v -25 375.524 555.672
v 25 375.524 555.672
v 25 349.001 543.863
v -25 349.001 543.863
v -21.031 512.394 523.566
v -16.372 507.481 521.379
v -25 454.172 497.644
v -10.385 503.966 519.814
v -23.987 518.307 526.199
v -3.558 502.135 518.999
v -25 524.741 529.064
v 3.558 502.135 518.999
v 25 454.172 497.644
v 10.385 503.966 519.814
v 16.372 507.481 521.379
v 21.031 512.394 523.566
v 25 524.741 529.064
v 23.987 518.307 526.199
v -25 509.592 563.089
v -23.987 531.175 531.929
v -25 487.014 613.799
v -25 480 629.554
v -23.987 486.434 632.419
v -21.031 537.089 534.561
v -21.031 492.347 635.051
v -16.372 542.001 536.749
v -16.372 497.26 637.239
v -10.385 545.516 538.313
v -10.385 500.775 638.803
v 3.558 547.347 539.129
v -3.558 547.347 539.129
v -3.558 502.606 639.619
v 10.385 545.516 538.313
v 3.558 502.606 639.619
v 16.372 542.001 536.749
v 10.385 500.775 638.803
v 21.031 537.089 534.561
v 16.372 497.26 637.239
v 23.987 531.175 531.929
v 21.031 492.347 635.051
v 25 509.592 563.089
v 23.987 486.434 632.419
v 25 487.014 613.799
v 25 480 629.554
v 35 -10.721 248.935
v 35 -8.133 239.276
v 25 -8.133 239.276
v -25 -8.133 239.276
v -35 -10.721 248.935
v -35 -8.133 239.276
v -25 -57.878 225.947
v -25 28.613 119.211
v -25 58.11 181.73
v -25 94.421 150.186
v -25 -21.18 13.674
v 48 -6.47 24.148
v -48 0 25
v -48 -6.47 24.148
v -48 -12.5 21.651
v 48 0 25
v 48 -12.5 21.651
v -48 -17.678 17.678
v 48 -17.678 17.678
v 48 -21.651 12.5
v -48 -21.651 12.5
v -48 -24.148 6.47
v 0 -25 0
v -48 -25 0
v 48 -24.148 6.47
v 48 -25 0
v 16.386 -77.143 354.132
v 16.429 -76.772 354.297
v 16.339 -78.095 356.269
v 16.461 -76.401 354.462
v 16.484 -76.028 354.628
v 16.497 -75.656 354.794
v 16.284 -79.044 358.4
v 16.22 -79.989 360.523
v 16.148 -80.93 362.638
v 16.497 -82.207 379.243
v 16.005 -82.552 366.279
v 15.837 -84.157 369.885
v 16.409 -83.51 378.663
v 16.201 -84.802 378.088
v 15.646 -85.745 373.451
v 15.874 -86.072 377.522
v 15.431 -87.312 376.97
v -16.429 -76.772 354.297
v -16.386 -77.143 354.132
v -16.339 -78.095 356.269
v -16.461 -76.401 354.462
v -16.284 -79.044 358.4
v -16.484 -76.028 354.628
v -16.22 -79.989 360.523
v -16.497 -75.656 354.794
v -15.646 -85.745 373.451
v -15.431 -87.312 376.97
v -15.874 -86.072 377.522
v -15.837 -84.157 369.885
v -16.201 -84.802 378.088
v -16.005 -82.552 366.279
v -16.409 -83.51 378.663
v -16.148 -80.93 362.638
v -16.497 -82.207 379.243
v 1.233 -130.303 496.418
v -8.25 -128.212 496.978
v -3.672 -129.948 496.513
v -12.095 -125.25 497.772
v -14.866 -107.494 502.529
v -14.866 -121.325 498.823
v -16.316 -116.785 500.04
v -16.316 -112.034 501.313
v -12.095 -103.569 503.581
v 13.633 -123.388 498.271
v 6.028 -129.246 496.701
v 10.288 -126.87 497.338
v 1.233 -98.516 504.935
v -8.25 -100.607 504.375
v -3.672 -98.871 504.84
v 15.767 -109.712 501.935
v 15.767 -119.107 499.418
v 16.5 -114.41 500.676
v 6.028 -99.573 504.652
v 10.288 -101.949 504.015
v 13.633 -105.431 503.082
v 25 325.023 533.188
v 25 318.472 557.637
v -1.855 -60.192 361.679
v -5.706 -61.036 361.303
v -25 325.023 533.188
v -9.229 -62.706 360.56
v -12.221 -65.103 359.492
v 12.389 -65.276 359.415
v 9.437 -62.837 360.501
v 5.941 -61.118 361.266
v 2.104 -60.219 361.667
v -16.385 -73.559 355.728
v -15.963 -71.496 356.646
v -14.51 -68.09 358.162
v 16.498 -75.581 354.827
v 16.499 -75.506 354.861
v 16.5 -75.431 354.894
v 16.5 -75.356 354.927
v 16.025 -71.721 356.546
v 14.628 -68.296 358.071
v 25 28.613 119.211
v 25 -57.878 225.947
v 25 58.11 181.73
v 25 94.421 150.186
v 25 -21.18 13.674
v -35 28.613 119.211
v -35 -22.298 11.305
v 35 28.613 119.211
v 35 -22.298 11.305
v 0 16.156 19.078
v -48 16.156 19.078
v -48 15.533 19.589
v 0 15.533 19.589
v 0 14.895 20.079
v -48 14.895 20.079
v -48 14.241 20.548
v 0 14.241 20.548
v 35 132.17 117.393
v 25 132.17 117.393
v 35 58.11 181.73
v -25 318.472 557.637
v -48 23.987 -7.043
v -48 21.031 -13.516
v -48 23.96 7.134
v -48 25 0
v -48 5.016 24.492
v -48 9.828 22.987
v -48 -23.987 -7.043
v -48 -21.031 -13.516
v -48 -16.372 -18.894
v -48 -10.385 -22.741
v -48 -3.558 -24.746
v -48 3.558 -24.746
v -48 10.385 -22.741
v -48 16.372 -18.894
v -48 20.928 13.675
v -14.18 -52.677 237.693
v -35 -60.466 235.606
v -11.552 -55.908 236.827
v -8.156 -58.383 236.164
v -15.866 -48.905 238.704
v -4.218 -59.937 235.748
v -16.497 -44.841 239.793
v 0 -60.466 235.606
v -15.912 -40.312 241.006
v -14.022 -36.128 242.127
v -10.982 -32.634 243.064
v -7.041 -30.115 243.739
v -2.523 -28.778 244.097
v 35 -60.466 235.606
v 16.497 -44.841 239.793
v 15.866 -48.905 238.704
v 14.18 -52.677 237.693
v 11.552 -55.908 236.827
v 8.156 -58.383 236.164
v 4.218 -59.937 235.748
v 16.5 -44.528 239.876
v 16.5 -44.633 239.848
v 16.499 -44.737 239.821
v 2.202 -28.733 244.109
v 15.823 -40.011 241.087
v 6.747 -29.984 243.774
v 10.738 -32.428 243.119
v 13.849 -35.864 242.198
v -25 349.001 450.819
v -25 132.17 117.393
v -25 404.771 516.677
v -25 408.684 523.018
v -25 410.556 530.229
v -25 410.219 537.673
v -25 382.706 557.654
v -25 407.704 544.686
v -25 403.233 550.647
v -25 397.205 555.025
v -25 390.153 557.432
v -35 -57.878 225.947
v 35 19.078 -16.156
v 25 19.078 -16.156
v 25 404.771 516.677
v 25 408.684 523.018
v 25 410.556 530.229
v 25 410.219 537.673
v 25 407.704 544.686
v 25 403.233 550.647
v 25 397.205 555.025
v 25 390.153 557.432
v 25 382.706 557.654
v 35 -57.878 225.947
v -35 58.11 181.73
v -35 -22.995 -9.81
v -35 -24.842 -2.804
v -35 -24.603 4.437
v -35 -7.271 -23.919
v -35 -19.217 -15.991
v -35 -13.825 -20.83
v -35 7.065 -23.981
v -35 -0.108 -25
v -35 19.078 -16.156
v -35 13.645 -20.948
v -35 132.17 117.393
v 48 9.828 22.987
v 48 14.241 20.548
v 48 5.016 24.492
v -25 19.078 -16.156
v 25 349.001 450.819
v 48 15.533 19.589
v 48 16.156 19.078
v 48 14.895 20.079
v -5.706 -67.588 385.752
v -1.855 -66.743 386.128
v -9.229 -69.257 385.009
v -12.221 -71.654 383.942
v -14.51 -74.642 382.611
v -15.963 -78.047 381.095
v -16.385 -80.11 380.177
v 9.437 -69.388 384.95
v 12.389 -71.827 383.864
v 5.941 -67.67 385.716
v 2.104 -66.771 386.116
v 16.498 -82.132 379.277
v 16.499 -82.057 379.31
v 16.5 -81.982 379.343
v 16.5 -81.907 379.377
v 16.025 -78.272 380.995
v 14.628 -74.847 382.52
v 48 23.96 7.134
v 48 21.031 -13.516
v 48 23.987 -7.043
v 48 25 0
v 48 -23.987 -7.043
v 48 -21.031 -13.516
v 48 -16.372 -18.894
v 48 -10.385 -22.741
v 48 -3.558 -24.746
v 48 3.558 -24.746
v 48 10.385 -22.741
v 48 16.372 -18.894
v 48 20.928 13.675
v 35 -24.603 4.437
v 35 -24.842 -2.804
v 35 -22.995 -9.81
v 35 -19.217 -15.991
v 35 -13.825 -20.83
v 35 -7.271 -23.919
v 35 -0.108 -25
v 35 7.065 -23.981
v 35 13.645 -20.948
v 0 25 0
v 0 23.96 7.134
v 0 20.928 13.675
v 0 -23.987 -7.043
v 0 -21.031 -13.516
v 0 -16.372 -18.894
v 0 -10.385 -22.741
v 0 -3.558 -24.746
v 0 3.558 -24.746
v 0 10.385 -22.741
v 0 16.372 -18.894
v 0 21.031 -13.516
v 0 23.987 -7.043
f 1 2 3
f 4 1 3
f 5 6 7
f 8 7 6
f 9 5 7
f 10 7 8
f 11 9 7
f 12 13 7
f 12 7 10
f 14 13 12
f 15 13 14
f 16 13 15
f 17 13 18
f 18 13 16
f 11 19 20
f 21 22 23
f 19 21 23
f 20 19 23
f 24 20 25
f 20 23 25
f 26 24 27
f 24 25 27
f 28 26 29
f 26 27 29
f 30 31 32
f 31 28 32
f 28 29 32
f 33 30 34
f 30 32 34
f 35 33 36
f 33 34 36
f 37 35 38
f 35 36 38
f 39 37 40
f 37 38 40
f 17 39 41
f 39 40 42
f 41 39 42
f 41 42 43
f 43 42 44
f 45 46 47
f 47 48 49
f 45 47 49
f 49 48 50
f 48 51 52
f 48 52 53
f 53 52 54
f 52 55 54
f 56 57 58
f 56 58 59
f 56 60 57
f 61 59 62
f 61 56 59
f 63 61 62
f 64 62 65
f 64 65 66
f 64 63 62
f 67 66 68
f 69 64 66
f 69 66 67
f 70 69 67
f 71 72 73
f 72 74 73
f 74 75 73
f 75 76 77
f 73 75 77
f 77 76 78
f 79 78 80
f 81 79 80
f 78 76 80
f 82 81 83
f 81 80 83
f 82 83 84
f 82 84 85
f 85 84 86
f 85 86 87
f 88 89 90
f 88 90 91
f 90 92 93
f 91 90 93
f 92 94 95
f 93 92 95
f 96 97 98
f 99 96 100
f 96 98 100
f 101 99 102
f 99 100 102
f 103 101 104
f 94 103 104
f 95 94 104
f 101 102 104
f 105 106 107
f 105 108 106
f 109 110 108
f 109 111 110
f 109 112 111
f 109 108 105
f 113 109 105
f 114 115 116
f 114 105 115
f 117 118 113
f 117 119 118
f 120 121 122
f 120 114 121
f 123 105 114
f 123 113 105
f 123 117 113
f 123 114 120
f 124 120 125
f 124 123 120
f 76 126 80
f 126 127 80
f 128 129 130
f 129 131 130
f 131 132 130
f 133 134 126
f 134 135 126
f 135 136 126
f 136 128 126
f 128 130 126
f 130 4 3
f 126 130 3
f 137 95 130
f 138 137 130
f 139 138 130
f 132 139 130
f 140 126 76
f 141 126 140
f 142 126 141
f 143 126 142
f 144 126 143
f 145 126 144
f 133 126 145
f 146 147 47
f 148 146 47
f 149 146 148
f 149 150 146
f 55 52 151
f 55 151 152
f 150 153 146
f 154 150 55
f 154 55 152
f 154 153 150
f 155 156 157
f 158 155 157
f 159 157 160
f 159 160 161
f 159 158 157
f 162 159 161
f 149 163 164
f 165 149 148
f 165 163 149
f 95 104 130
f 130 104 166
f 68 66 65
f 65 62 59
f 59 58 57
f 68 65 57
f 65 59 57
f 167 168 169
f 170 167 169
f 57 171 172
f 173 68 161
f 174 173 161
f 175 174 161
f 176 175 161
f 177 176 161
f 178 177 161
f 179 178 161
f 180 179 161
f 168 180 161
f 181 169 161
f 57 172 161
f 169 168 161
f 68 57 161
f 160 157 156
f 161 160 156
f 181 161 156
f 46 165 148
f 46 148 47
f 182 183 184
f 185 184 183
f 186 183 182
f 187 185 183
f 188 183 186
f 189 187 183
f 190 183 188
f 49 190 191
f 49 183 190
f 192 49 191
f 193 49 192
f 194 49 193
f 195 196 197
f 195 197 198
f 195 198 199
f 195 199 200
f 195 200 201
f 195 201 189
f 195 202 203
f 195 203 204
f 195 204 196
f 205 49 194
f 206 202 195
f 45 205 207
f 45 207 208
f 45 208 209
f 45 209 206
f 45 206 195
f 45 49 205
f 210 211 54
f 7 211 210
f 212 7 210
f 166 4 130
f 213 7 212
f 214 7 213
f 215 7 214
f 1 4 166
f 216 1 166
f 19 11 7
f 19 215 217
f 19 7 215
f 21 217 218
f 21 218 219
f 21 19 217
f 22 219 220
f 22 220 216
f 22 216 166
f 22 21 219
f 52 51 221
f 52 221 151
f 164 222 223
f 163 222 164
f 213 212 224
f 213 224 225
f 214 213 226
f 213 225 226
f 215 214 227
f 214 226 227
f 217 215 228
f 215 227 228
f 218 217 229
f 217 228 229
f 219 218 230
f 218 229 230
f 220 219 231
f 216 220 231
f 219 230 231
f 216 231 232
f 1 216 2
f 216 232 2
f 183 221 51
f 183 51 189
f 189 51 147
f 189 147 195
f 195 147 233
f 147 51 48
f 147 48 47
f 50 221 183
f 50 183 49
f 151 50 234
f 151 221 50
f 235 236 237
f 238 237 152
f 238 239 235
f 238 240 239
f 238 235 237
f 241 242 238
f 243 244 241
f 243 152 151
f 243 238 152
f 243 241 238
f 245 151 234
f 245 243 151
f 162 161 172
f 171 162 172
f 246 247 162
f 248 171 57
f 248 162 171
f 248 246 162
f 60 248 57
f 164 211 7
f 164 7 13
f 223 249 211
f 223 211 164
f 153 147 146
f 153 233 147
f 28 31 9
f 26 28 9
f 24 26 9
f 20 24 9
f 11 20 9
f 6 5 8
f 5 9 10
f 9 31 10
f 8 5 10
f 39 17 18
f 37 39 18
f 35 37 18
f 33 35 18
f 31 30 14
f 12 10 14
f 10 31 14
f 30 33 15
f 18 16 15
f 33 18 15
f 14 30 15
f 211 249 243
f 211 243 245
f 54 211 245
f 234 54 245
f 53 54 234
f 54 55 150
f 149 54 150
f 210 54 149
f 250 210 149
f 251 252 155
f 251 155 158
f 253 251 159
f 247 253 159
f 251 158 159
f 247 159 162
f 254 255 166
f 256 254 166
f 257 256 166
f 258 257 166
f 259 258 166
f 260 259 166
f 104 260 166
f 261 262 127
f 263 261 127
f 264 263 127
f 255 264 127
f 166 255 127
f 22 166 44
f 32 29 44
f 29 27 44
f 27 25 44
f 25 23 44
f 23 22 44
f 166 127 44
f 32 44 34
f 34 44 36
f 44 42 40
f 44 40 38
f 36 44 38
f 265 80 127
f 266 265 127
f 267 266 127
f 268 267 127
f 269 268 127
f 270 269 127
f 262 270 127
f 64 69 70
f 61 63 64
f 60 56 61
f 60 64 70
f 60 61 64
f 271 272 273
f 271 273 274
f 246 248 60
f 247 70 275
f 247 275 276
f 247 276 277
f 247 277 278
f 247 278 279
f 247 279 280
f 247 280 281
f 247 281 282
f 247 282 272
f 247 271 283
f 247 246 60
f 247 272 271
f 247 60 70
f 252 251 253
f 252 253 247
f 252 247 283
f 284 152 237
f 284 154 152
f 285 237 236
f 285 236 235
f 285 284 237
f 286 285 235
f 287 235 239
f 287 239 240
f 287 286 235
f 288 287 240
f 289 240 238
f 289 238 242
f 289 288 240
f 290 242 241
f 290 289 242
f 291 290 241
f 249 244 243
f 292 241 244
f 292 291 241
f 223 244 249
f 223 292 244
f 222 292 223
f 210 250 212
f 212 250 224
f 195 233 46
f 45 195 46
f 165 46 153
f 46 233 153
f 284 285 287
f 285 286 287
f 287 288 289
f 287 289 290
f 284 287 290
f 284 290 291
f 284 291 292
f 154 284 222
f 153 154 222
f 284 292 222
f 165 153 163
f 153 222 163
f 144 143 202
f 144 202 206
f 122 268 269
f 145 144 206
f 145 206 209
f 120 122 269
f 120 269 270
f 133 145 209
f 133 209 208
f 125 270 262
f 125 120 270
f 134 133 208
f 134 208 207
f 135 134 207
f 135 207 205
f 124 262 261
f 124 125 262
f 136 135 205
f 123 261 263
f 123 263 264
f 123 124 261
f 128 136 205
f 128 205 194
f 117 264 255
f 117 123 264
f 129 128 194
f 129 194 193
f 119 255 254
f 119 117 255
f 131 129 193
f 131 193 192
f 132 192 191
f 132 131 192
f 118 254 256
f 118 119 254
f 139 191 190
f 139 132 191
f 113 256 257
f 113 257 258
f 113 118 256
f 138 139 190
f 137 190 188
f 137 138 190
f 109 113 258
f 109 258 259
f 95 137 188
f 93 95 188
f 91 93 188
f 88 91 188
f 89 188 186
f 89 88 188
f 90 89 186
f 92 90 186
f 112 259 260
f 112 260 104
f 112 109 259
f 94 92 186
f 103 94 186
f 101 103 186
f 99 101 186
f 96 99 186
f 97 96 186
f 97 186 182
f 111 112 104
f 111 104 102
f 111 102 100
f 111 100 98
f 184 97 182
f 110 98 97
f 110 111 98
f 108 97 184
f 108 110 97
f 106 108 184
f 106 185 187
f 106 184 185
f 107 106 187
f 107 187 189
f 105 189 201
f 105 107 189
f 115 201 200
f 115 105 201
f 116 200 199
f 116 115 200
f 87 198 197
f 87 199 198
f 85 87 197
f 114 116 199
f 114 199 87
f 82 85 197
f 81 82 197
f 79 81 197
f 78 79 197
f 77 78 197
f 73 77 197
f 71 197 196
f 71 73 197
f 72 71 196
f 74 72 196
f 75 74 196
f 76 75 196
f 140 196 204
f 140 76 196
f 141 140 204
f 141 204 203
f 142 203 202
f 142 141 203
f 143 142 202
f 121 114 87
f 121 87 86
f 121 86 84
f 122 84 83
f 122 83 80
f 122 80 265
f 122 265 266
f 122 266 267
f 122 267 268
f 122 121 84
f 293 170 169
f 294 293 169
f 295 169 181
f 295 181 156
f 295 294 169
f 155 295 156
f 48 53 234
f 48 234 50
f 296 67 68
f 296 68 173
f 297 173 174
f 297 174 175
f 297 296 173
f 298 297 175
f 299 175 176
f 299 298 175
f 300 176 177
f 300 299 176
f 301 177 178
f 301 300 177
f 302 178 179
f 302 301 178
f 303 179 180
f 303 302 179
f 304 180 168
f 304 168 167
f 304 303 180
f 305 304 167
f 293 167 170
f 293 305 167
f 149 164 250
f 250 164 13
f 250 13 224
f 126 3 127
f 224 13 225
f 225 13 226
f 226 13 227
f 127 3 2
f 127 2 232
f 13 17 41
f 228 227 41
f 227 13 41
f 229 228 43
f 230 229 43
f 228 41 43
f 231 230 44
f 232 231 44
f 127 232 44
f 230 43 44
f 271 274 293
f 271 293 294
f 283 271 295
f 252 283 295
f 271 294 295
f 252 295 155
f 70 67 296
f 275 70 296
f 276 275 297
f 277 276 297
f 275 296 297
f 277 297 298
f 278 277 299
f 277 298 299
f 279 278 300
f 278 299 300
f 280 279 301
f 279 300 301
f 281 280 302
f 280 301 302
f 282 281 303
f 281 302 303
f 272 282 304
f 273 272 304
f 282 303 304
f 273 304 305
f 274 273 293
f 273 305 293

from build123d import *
from build123d import SkipClean  # not in build123d's __all__

# Parameters (mm, degrees)
F5_DEPTH  = 48
F7_W      = 50
F7_H      = 50
F8_REACH  = 912.7734613462
F10_R     = 16.5
F11_DEPTH = 280
F4_W      = 50
F4_H      = 25
F12_DEPTH = 621
F14_DEPTH = 50
F16_DEPTH = 50
F19_DEPTH = 35
F20_W     = 50
F20_H     = 250
F21_REACH = 742.8364387972
F24_DEPTH = 142
F25_DEPTH = 270
F22_W     = 10
F22_H     = 51.5
F26_DEPTH = 10


# Not quite as in the source:
# - an extrude ends at something that could not be found from the text; its depth is read off the source's solid


with BuildPart() as f2:
    # F1 (on Right) → F2 (revolve)
    with BuildSketch(Plane.YZ):
        Polygon((502.8386364411, 639.7222130194), (480, 629.5537969425), (524.7410307383, 529.0637966018), (547.5796671794, 539.2322126787), align=None)
    revolve(axis=Axis((0, 502.3705153692, 579.3087967721), (0, 0.4067366431, -0.9135454576)))

    f8_end = f2.faces().sort_by_distance((0, 479.5318789281, 569.1403806952))[0]
    # F7 (on line) → F8 (join, up to a face of the model that its end follows)
    with BuildSketch(Plane(origin=(0, 0, 0), x_dir=(1, 0, 0), z_dir=(0, 0.6462360214, 0.7631376053))):
        Rectangle(F7_W, F7_H)
    f8_long = extrude(amount=F8_REACH, mode=Mode.PRIVATE)
    add(split(f8_long, bisect_by=f8_end, keep=Keep.ALL, mode=Mode.PRIVATE).solids().sort_by_distance((0, 0, 0))[0])



with BuildPart() as f5:
    # F0 (on Right) → F5 (new body, symmetric)
    with BuildSketch(Plane.YZ):
        with BuildLine():
            Line((0, 0), (0, 25))
            ThreePointArc((0, 25), (-17.6776695297, 17.6776695297), (-25, 0))
            Line((-25, 0), (0, 0))
        make_face()
        with BuildLine():
            Line((15, 17.7134416851), (14.2405756119, 20.5476520858))
            ThreePointArc((14.2405756119, 20.5476520858), (7.4601842422, 23.8609650072), (0, 25))
            Line((0, 25), (0, 0))
            Line((0, 0), (15, 17.7134416851))
        make_face()
        with BuildLine():
            ThreePointArc((16.1559005349, 19.078440133), (15.2159812854, 19.8361768878), (14.2405756119, 20.5476520858))
            Line((14.2405756119, 20.5476520858), (15, 17.7134416851))
            Line((15, 17.7134416851), (16.1559005349, 19.078440133))
        make_face()
        with BuildLine():
            Line((16.1559005349, 19.078440133), (15, 17.7134416851))
            Line((15, 17.7134416851), (0, 0))
            Line((0, 0), (25, 0))
            ThreePointArc((25, 0), (22.6814628427, 10.5143351342), (16.1559005349, 19.078440133))
        make_face()
        with BuildLine():
            Line((0, 0), (-25, 0))
            ThreePointArc((-25, 0), (0, -25), (25, 0))
            Line((25, 0), (0, 0))
        make_face()
    extrude(amount=F5_DEPTH, both=True)


with BuildPart() as f11:
    # F10 (on line) → F11 (new body)
    with BuildSketch(Plane(origin=(0, -132.8330735009, 495.739779231), x_dir=(1, 0, 0), z_dir=(0, -0.2588190451, 0.9659258263))):
        with Locations((0, 19.0734634568)):
            Circle(F10_R)
    extrude(amount=-F11_DEPTH)


with BuildPart() as f2_1:
    add(f2.part, clean=False)

    add(f11.part)  # F12 merges F11
    # F4 (on line) → F12 (join)
    with BuildSketch(Plane(origin=(0, 634.5161688048, 282.504799644), x_dir=(1, 0, 0), z_dir=(0, -0.9135454576, -0.4067366431))):
        with Locations((0, 367.3924228621)):
            Rectangle(F4_W, F4_H)
    extrude(amount=F12_DEPTH)

    # F13 (on face) → F14 (join, through all)
    with BuildSketch(Plane.YZ.offset(25)):
        Polygon((509.5918311512, 563.0894559697), (480, 629.5537969425), (349.0007462707, 571.2291714281), (349.0007462707, 450.8191807925), (454.1720638958, 497.6444682709), align=None)
        Polygon((524.7410307383, 529.0637966018), (509.5918311512, 563.0894559697), (454.1720638958, 497.6444682709), align=None)
    extrude(amount=-F14_DEPTH)

    # F15 (on face) → F16 (cut, through all)
    with BuildSketch(Plane.YZ.offset(25)):
        with BuildLine():
            Line((375.5236657091, 555.6720290176), (349.0007462707, 543.8632644655))
            Line((349.0007462707, 543.8632644655), (349.0007462707, 450.8191807925))
            Line((349.0007462707, 450.8191807925), (404.770521919, 516.6774920417))
            ThreePointArc((404.770521919, 516.6774920417), (405.6918470512, 547.8337055512), (375.5236657091, 555.6720290176))
        make_face()
    extrude(amount=-F16_DEPTH, mode=Mode.SUBTRACT)

    # F18 (on Right) → F19 (join, symmetric)
    with BuildSketch(Plane.YZ):
        with BuildLine():
            ThreePointArc((19.078440133, -16.1559005349), (23.4729738564, -8.6034585103), (25, 0))
            ThreePointArc((25, 0), (5.8117636963, 24.3150859085), (-22.2978722191, 11.3050826844))
            ThreePointArc((-22.2978722191, 11.3050826844), (-13.8245284036, -20.8298443206), (19.078440133, -16.1559005349))
        make_face()
        with BuildLine():
            ThreePointArc((-22.2978722191, 11.3050826844), (5.8117636963, 24.3150859085), (25, 0))
            ThreePointArc((25, 0), (23.4729738564, -8.6034585103), (19.078440133, -16.1559005349))
            Line((19.078440133, -16.1559005349), (132.169743877, 117.393180396))
            Line((132.169743877, 117.393180396), (58.1101733819, 181.729680453))
            Line((58.1101733819, 181.729680453), (28.6130073485, 119.2105305473))
            Line((28.6130073485, 119.2105305473), (-22.2978722191, 11.3050826844))
        make_face()
        Polygon((-57.8779660563, 225.9466092245), (28.6130073485, 119.2105305473), (58.1101733819, 181.729680453), (-8.1327860024, 239.2757900473), align=None)
    extrude(amount=F19_DEPTH, both=True)

    f21_end = Plane(origin=(0, -30.2261892372, 233.3558804925), x_dir=(0, 0.9659258263, 0.2588190451), z_dir=(0, -0.2588190451, 0.9659258263))
    # F20 (on face) → F21 (cut, up to a plane its end follows)
    with BuildSketch(Plane(origin=(0, -19.078440133, 16.1559005349), x_dir=(1, 0, 0), z_dir=(0, -0.7631376053, 0.6462360214))):
        with Locations((0, 100)):
            Rectangle(F20_W, F20_H)
    f21_long = extrude(amount=F21_REACH, mode=Mode.PRIVATE)
    add(split(f21_long, bisect_by=f21_end, keep=Keep.BOTTOM, mode=Mode.PRIVATE), mode=Mode.SUBTRACT)

    # F23 (on face) → F24 (cut)
    with BuildSketch(Plane(origin=(0, -132.8330735009, 495.739779231), x_dir=(1, 0, 0), z_dir=(0, -0.2588190451, 0.9659258263))):
        with BuildLine():
            ThreePointArc((0, 2.5734634568), (-11.5522090109, 7.2922722195), (-16.4968222509, 18.7496492786))
            Line((-16.4968222509, 18.7496492786), (-18.4926110681, 120.4257820466))
            Line((-18.4926110681, 120.4257820466), (-58.093066782, 121.2030947208))
            Line((-58.093066782, 121.2030947208), (-58.093066782, 2.5734634568))
            Line((-58.093066782, 2.5734634568), (0, 2.5734634568))
        make_face()
        Polygon((-58.093066782, 121.2030947208), (-18.4926110681, 120.4257820466), (-25, 451.9469005739), (-58.093066782, 452.5964804784), align=None)
        with BuildLine():
            Line((18.4783664089, 119.7000830905), (16.4968222509, 18.7496492786))
            ThreePointArc((16.4968222509, 18.7496492786), (11.5522090109, 7.2922722195), (0, 2.5734634568))
            Line((0, 2.5734634568), (64.5229642251, 2.5734634568))
            Line((64.5229642251, 2.5734634568), (64.5229642251, 118.796279111))
            Line((64.5229642251, 118.796279111), (18.4783664089, 119.7000830905))
        make_face()
        Polygon((25, 451.9469005739), (18.4783664089, 119.7000830905), (64.5229642251, 118.796279111), (64.5229642251, 451.171108971), align=None)
    with SkipClean():  # cleaning this boolean's faces spoils the solid; the shape is the same uncleaned
        extrude(amount=-F24_DEPTH, mode=Mode.SUBTRACT)

    # F23 (on face) → F25 (cut, through all)
    with BuildSketch(Plane(origin=(0, -132.8330735009, 495.739779231), x_dir=(1, 0, 0), z_dir=(0, -0.2588190451, 0.9659258263))):
        with BuildLine():
            Line((18.4783664089, 119.7000830905), (16.4968222509, 18.7496492786))
            ThreePointArc((16.4968222509, 18.7496492786), (11.5522090109, 7.2922722195), (0, 2.5734634568))
            Line((0, 2.5734634568), (64.5229642251, 2.5734634568))
            Line((64.5229642251, 2.5734634568), (64.5229642251, 118.796279111))
            Line((64.5229642251, 118.796279111), (18.4783664089, 119.7000830905))
        make_face()
        with BuildLine():
            ThreePointArc((0, 2.5734634568), (-11.5522090109, 7.2922722195), (-16.4968222509, 18.7496492786))
            Line((-16.4968222509, 18.7496492786), (-18.4926110681, 120.4257820466))
            Line((-18.4926110681, 120.4257820466), (-58.093066782, 121.2030947208))
            Line((-58.093066782, 121.2030947208), (-58.093066782, 2.5734634568))
            Line((-58.093066782, 2.5734634568), (0, 2.5734634568))
        make_face()
    extrude(amount=-F25_DEPTH, mode=Mode.SUBTRACT)

    # F22 (on face) → F26 (join)
    with BuildSketch(Plane(origin=(0, -60.3637408722, 225.28054787), x_dir=(1, 0, 0), z_dir=(0, -0.2588190451, 0.9659258263))):
        Polygon((-25, 54.0734634568), (-25, 2.5734634568), (0, 2.5734634568), (35, 2.5734634568), (35, 54.0734634568), align=None)
        with BuildLine():
            ThreePointArc((16.5, 19.0734634568), (11.6672618896, 7.4062015672), (0, 2.5734634568))
            ThreePointArc((0, 2.5734634568), (-11.6672618896, 30.7407253463), (16.5, 19.0734634568))
        make_face(mode=Mode.SUBTRACT)
        with Locations((-30, 28.3234634568)):
            Rectangle(F22_W, F22_H)
    extrude(amount=F26_DEPTH)


solid = Compound([f5.part, f2_1.part])
